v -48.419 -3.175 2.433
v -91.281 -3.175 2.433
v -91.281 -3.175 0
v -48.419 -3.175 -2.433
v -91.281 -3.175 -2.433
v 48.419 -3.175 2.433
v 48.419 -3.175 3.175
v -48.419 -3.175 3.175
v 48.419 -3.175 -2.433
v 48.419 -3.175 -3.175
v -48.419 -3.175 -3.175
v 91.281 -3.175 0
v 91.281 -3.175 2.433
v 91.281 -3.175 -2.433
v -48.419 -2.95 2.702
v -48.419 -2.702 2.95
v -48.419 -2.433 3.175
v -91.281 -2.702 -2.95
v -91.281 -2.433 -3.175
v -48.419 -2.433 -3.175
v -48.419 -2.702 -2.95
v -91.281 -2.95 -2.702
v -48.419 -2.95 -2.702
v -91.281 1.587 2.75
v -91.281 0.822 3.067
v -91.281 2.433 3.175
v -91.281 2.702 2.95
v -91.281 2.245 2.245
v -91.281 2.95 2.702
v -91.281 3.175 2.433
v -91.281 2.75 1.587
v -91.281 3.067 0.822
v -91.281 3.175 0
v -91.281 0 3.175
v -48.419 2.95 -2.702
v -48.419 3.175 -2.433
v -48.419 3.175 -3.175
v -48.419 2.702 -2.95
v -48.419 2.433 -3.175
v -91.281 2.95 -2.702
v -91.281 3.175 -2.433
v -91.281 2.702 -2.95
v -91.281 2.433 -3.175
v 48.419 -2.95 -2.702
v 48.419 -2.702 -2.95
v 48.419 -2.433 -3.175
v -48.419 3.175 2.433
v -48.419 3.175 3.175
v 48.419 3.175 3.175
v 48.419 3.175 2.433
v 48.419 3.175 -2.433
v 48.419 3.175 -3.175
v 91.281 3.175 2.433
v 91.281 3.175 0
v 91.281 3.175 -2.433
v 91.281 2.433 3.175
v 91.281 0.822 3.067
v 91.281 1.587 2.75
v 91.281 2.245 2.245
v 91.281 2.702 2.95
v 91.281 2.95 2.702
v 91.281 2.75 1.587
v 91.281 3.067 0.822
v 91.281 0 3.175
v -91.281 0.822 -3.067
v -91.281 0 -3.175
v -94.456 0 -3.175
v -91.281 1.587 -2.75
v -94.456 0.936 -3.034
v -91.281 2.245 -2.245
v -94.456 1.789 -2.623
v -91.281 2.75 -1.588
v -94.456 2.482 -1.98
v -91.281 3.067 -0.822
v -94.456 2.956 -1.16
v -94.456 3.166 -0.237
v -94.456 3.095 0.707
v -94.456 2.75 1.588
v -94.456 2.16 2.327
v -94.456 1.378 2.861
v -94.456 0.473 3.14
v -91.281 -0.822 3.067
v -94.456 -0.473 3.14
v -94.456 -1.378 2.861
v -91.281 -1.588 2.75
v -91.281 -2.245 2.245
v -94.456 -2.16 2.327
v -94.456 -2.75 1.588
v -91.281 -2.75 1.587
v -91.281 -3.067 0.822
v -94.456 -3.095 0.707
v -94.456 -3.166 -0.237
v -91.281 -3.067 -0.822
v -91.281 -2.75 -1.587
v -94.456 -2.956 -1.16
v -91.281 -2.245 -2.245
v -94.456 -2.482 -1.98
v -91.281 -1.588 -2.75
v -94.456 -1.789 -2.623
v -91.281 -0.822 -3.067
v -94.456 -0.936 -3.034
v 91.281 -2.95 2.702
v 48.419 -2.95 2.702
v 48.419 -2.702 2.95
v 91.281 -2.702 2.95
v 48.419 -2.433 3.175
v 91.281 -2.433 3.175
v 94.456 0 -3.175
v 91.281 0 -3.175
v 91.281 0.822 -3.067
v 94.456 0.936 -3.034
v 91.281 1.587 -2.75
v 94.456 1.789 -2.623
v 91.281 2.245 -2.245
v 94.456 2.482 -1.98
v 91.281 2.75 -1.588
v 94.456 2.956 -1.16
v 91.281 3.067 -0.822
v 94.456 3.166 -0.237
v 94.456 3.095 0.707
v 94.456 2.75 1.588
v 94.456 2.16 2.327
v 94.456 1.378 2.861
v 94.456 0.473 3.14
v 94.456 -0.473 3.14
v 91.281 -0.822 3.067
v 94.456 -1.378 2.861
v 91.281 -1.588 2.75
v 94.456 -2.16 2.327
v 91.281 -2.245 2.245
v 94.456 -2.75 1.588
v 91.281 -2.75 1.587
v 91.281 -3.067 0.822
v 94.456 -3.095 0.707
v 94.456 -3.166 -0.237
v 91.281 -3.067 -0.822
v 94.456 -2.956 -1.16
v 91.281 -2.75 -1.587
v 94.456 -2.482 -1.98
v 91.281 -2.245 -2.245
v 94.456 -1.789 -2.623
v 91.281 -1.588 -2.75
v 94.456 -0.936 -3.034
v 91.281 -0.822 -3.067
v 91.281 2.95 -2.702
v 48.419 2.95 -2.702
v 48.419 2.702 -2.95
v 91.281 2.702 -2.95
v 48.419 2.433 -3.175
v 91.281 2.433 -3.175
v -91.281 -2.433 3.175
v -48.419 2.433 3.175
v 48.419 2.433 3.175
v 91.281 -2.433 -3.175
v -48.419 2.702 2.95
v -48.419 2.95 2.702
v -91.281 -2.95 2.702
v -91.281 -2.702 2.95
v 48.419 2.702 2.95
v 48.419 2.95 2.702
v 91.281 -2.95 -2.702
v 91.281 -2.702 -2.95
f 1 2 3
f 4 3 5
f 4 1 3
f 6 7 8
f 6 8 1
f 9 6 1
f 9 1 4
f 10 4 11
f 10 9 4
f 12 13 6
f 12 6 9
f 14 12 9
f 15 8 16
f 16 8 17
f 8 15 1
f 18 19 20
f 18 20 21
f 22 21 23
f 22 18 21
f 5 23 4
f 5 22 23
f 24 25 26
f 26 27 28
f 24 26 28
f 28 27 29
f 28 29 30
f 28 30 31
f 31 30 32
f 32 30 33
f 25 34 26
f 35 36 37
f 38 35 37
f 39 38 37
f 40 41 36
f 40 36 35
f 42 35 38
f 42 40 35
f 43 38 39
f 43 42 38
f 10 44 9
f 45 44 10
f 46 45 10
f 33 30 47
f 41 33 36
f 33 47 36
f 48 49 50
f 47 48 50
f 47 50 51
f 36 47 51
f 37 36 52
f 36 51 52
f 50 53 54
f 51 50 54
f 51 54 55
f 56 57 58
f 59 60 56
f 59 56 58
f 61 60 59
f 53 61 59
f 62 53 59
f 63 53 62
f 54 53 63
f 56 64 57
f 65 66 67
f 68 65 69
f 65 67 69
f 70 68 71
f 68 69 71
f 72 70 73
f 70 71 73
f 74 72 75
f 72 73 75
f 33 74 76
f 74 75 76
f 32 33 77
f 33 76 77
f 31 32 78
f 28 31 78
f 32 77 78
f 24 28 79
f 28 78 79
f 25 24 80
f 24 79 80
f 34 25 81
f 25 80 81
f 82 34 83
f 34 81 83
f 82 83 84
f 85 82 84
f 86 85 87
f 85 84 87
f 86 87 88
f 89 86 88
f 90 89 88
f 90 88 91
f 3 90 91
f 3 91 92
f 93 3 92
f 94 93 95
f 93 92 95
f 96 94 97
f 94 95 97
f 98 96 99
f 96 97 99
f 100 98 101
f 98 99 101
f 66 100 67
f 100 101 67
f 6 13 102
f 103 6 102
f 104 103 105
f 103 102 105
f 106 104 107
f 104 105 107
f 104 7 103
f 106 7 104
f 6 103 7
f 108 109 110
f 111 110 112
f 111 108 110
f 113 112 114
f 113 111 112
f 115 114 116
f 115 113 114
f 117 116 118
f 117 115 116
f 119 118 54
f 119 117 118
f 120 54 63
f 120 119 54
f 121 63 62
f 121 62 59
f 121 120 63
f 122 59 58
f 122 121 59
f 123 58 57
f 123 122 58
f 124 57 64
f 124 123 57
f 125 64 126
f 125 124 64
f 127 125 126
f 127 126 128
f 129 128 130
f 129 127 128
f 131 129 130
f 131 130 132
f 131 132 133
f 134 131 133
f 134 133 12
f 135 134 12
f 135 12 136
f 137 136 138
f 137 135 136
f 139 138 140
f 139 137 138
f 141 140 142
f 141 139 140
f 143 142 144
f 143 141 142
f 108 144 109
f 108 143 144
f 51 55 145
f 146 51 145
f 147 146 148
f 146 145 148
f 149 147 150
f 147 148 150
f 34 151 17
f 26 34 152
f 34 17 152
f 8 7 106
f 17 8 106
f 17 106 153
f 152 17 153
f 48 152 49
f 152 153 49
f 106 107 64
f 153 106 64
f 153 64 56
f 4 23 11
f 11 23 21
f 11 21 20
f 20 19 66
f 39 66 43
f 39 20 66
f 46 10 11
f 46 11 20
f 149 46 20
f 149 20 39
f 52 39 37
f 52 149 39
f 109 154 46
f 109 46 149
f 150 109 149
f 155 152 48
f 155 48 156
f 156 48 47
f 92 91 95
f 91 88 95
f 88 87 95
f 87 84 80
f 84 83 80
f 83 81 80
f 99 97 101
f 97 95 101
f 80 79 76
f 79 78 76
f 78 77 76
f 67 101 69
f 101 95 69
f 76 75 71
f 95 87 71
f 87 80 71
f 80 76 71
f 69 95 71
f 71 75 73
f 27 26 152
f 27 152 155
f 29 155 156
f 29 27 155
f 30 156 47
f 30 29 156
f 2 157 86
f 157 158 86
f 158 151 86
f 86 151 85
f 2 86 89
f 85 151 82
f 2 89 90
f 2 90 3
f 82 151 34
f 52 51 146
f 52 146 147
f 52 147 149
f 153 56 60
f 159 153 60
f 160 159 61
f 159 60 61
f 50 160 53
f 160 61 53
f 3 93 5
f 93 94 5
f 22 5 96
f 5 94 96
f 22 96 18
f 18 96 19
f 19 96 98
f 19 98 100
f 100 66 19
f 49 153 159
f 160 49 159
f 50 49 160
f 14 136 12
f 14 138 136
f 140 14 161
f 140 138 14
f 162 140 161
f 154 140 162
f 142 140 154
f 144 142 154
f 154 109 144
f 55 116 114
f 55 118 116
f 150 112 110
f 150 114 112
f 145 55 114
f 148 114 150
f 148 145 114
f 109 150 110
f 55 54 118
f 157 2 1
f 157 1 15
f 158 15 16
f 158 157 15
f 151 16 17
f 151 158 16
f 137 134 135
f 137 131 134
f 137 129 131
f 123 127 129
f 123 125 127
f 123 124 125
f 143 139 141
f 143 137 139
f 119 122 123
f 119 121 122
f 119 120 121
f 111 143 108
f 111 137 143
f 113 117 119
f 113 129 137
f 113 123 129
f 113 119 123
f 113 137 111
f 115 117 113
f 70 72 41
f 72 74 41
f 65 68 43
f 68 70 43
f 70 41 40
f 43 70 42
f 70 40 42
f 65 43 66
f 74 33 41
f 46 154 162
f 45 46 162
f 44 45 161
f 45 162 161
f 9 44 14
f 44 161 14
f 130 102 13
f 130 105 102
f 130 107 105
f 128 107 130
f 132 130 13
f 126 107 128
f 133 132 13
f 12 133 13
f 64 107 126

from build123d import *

# Parameters (mm, degrees)
SKETCH1_W           = 6.35
SKETCH1_H           = 6.35
BOSS_EXTRUDE1_DEPTH = 94.45625
SKETCH2_W           = 7.9375
SKETCH2_H           = 7.9375
SKETCH2_R           = 3.175
CUT_EXTRUDE1_DEPTH  = 3.175
CUT_EXTRUDE2_DEPTH  = 42.8625


with BuildPart() as part:
    # Sketch1 → Boss-Extrude1 (new body)
    with BuildSketch(Plane(origin=(0, 0, 0), x_dir=(0, 0, -1), z_dir=(1, 0, 0))):
        Rectangle(SKETCH1_W, SKETCH1_H)
    extrude(amount=BOSS_EXTRUDE1_DEPTH)

    # Sketch2 → Cut-Extrude1 (cut)
    with BuildSketch(Plane(origin=(94.45625, 0, 0), x_dir=(0, 0, -1), z_dir=(1, 0, 0))):
        Rectangle(SKETCH2_W, SKETCH2_H)
        Circle(SKETCH2_R, mode=Mode.SUBTRACT)
    extrude(amount=-CUT_EXTRUDE1_DEPTH, mode=Mode.SUBTRACT)

    # Sketch3 → Cut-Extrude2 (cut)
    with BuildSketch(Plane(origin=(91.28125, 0, 0), x_dir=(0, 0, -1), z_dir=(1, 0, 0))):
        with BuildLine():
            Line((-3.175, -2.432976572), (-3.175, -3.175))
            Line((-3.175, -3.175), (-2.432976572, -3.175))
            ThreePointArc((-2.432976572, -3.175), (-2.828427125, -2.828427125), (-3.175, -2.432976572))
        make_face()
        with BuildLine():
            Line((2.432976572, -3.175), (3.175, -3.175))
            Line((3.175, -3.175), (3.175, -2.432976572))
            ThreePointArc((3.175, -2.432976572), (2.828427125, -2.828427125), (2.432976572, -3.175))
        make_face()
        with BuildLine():
            Line((3.175, 2.432976572), (3.175, 3.175))
            Line((3.175, 3.175), (2.432976572, 3.175))
            ThreePointArc((2.432976572, 3.175), (2.828427125, 2.828427125), (3.175, 2.432976572))
        make_face()
        with BuildLine():
            Line((-3.175, 3.175), (-3.175, 2.432976572))
            ThreePointArc((-3.175, 2.432976572), (-2.828427125, 2.828427125), (-2.432976572, 3.175))
            Line((-2.432976572, 3.175), (-3.175, 3.175))
        make_face()
    extrude(amount=-CUT_EXTRUDE2_DEPTH, mode=Mode.SUBTRACT)

    # Mirror1: part across plane


with BuildPart() as part_1:
    add(part.part)
    add(part.part.mirror(Plane(origin=(0, 0, 0), x_dir=(0, 0, 1), z_dir=(1, 0, 0))))


solid = part_1.part
